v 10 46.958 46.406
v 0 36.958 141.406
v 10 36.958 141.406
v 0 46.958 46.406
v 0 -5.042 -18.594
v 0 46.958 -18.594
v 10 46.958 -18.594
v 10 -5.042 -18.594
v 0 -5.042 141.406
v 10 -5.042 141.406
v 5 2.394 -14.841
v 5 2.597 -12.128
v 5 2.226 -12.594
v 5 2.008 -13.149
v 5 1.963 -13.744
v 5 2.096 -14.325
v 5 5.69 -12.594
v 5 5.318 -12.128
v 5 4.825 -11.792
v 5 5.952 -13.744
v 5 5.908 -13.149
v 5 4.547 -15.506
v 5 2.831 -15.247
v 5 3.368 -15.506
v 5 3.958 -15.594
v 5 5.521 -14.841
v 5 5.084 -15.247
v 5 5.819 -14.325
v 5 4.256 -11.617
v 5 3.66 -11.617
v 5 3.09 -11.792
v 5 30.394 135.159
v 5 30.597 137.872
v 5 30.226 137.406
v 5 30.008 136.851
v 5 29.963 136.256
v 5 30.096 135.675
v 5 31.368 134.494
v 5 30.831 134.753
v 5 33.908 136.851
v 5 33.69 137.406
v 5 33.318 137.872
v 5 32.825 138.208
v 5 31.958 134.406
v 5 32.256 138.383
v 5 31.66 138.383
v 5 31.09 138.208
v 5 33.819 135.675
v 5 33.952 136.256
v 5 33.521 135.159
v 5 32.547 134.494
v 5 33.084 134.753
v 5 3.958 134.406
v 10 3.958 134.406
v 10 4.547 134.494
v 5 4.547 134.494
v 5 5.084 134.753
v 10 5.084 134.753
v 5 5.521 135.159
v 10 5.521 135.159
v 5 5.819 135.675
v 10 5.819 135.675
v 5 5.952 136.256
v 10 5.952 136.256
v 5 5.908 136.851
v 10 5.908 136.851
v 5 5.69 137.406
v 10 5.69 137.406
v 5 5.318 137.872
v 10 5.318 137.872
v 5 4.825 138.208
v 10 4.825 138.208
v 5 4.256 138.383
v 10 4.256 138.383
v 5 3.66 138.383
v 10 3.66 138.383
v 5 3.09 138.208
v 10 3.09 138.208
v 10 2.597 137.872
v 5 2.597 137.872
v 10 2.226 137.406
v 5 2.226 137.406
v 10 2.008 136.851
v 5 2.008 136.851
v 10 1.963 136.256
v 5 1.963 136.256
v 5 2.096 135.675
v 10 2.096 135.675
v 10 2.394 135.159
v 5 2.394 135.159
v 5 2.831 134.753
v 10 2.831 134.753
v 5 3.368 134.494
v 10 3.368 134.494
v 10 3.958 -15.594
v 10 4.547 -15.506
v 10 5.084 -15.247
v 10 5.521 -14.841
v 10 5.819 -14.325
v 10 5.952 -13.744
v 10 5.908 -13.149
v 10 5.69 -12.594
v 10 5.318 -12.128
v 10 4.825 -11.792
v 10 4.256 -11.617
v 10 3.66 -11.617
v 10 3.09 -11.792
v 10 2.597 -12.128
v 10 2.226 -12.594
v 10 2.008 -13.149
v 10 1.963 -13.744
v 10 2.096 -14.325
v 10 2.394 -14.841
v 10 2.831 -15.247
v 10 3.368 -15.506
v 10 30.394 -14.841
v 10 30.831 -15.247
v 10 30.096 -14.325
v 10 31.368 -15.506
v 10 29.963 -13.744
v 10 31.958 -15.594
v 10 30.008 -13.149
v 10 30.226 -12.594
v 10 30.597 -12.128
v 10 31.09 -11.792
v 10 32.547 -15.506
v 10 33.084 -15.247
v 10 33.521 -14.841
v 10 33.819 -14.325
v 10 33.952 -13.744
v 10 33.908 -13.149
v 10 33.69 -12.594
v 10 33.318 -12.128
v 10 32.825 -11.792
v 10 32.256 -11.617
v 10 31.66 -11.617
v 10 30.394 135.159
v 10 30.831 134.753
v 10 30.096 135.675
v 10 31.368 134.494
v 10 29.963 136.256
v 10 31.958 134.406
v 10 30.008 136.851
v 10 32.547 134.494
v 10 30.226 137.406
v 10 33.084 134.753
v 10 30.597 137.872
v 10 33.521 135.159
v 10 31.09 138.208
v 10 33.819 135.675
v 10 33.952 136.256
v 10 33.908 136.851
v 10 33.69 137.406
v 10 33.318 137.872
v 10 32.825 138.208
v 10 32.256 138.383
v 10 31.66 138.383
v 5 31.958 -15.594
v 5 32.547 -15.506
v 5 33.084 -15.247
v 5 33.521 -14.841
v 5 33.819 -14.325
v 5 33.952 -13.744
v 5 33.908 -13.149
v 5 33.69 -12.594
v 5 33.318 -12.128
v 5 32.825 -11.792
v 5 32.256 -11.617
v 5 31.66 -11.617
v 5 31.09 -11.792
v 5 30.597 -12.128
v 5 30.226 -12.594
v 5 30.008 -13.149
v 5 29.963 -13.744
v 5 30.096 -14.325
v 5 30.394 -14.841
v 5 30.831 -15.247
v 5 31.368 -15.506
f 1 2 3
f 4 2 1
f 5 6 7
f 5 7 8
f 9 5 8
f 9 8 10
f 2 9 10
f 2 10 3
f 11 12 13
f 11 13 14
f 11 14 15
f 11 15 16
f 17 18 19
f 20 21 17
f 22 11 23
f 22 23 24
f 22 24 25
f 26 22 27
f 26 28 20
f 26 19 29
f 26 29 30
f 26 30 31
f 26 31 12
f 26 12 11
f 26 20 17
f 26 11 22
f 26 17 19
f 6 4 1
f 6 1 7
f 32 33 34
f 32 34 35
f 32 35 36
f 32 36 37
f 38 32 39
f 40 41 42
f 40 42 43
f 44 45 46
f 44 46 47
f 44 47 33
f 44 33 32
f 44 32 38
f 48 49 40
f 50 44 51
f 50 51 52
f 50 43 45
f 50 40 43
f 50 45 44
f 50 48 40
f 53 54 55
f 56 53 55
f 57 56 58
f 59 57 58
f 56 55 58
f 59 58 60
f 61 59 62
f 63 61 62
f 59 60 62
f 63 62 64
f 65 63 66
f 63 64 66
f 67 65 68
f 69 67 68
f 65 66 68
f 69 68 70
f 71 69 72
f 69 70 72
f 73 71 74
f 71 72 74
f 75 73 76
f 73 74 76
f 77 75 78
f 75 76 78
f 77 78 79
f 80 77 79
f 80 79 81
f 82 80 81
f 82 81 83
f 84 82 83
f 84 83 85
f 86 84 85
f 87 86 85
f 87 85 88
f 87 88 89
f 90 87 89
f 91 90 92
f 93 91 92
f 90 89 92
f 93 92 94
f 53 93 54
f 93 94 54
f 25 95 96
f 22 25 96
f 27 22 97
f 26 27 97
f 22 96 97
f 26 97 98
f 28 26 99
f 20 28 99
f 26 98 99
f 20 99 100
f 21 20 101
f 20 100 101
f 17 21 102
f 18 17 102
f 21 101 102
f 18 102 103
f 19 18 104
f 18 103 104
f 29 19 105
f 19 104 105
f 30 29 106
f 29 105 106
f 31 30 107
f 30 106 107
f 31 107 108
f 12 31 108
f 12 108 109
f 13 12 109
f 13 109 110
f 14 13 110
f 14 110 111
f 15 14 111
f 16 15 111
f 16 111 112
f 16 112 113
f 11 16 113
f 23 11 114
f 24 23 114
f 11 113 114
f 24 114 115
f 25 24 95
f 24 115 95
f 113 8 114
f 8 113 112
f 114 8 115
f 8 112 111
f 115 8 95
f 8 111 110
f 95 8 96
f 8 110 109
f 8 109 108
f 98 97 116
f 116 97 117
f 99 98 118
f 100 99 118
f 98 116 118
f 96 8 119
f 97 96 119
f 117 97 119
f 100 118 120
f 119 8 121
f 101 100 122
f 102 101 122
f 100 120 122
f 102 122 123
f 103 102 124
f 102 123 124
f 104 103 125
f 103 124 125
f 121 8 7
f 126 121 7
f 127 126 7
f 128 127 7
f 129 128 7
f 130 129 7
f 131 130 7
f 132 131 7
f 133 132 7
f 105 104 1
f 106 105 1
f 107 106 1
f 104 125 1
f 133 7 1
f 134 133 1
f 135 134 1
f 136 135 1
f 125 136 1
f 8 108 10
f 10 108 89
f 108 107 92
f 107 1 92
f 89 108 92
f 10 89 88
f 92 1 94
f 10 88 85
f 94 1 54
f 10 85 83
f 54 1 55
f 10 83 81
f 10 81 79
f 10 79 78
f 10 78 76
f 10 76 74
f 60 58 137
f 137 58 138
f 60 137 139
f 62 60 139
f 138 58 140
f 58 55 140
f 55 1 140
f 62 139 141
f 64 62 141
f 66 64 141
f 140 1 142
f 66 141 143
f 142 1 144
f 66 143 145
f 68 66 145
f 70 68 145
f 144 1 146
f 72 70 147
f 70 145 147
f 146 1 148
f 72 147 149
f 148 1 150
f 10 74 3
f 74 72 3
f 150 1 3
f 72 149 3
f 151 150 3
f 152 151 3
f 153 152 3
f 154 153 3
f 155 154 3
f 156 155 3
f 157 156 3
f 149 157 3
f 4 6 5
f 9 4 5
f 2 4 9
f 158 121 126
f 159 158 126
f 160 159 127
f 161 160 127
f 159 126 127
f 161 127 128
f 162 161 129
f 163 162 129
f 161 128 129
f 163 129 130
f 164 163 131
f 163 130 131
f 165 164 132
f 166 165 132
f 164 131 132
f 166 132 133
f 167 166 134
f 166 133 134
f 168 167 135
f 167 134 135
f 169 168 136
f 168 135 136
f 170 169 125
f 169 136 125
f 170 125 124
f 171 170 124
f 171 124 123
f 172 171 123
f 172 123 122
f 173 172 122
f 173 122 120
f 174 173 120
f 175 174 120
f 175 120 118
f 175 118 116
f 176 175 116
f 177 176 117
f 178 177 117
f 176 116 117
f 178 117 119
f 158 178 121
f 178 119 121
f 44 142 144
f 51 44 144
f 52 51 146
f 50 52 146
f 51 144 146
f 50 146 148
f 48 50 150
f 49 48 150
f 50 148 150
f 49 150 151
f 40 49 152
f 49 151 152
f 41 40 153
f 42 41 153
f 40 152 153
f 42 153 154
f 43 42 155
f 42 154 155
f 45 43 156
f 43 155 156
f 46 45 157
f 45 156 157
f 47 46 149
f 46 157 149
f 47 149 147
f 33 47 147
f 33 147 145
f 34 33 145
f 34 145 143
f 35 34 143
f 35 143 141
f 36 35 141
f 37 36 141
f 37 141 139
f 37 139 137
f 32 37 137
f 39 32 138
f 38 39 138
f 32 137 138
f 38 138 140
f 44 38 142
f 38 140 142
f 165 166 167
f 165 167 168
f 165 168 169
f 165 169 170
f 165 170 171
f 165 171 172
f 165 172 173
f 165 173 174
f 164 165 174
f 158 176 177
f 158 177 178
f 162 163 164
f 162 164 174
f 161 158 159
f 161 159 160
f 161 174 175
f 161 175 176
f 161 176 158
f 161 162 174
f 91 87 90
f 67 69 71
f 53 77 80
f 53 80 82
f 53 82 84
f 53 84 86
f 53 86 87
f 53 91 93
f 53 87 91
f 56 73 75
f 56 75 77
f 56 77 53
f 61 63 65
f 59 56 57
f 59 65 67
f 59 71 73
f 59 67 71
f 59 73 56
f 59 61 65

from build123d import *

# Parameters (mm, degrees)
BOSS_EXTRUDE1_DEPTH = 10
SKETCH4_R           = 2
CUT_EXTRUDE1_DEPTH  = 5


with BuildPart() as part:
    # Sketch3 → Boss-Extrude1 (new body)
    with BuildSketch(Plane(origin=(0, 0, 0), x_dir=(0, 0, -1), z_dir=(1, 0, 0))):
        Polygon((18.594382672, 46.957725761), (18.594382672, -5.042274239), (-141.405617328, -5.042274239), (-141.405617328, 36.957725761), (-46.405617328, 46.957725761), align=None)
    extrude(amount=BOSS_EXTRUDE1_DEPTH)

    # Sketch4 → Cut-Extrude1 (cut)
    with BuildSketch(Plane(origin=(10, 0, 0), x_dir=(0, 0, -1), z_dir=(1, 0, 0))):
        with Locations((-136.405617328, 31.957725761)):
            Circle(SKETCH4_R)
        with Locations((-136.405617328, 3.957725761)):
            Circle(SKETCH4_R)
        with Locations((13.594382672, 3.957725761)):
            Circle(SKETCH4_R)
        with Locations((13.594382672, 31.957725761)):
            Circle(SKETCH4_R)
    extrude(amount=-CUT_EXTRUDE1_DEPTH, mode=Mode.SUBTRACT)


solid = part.part
